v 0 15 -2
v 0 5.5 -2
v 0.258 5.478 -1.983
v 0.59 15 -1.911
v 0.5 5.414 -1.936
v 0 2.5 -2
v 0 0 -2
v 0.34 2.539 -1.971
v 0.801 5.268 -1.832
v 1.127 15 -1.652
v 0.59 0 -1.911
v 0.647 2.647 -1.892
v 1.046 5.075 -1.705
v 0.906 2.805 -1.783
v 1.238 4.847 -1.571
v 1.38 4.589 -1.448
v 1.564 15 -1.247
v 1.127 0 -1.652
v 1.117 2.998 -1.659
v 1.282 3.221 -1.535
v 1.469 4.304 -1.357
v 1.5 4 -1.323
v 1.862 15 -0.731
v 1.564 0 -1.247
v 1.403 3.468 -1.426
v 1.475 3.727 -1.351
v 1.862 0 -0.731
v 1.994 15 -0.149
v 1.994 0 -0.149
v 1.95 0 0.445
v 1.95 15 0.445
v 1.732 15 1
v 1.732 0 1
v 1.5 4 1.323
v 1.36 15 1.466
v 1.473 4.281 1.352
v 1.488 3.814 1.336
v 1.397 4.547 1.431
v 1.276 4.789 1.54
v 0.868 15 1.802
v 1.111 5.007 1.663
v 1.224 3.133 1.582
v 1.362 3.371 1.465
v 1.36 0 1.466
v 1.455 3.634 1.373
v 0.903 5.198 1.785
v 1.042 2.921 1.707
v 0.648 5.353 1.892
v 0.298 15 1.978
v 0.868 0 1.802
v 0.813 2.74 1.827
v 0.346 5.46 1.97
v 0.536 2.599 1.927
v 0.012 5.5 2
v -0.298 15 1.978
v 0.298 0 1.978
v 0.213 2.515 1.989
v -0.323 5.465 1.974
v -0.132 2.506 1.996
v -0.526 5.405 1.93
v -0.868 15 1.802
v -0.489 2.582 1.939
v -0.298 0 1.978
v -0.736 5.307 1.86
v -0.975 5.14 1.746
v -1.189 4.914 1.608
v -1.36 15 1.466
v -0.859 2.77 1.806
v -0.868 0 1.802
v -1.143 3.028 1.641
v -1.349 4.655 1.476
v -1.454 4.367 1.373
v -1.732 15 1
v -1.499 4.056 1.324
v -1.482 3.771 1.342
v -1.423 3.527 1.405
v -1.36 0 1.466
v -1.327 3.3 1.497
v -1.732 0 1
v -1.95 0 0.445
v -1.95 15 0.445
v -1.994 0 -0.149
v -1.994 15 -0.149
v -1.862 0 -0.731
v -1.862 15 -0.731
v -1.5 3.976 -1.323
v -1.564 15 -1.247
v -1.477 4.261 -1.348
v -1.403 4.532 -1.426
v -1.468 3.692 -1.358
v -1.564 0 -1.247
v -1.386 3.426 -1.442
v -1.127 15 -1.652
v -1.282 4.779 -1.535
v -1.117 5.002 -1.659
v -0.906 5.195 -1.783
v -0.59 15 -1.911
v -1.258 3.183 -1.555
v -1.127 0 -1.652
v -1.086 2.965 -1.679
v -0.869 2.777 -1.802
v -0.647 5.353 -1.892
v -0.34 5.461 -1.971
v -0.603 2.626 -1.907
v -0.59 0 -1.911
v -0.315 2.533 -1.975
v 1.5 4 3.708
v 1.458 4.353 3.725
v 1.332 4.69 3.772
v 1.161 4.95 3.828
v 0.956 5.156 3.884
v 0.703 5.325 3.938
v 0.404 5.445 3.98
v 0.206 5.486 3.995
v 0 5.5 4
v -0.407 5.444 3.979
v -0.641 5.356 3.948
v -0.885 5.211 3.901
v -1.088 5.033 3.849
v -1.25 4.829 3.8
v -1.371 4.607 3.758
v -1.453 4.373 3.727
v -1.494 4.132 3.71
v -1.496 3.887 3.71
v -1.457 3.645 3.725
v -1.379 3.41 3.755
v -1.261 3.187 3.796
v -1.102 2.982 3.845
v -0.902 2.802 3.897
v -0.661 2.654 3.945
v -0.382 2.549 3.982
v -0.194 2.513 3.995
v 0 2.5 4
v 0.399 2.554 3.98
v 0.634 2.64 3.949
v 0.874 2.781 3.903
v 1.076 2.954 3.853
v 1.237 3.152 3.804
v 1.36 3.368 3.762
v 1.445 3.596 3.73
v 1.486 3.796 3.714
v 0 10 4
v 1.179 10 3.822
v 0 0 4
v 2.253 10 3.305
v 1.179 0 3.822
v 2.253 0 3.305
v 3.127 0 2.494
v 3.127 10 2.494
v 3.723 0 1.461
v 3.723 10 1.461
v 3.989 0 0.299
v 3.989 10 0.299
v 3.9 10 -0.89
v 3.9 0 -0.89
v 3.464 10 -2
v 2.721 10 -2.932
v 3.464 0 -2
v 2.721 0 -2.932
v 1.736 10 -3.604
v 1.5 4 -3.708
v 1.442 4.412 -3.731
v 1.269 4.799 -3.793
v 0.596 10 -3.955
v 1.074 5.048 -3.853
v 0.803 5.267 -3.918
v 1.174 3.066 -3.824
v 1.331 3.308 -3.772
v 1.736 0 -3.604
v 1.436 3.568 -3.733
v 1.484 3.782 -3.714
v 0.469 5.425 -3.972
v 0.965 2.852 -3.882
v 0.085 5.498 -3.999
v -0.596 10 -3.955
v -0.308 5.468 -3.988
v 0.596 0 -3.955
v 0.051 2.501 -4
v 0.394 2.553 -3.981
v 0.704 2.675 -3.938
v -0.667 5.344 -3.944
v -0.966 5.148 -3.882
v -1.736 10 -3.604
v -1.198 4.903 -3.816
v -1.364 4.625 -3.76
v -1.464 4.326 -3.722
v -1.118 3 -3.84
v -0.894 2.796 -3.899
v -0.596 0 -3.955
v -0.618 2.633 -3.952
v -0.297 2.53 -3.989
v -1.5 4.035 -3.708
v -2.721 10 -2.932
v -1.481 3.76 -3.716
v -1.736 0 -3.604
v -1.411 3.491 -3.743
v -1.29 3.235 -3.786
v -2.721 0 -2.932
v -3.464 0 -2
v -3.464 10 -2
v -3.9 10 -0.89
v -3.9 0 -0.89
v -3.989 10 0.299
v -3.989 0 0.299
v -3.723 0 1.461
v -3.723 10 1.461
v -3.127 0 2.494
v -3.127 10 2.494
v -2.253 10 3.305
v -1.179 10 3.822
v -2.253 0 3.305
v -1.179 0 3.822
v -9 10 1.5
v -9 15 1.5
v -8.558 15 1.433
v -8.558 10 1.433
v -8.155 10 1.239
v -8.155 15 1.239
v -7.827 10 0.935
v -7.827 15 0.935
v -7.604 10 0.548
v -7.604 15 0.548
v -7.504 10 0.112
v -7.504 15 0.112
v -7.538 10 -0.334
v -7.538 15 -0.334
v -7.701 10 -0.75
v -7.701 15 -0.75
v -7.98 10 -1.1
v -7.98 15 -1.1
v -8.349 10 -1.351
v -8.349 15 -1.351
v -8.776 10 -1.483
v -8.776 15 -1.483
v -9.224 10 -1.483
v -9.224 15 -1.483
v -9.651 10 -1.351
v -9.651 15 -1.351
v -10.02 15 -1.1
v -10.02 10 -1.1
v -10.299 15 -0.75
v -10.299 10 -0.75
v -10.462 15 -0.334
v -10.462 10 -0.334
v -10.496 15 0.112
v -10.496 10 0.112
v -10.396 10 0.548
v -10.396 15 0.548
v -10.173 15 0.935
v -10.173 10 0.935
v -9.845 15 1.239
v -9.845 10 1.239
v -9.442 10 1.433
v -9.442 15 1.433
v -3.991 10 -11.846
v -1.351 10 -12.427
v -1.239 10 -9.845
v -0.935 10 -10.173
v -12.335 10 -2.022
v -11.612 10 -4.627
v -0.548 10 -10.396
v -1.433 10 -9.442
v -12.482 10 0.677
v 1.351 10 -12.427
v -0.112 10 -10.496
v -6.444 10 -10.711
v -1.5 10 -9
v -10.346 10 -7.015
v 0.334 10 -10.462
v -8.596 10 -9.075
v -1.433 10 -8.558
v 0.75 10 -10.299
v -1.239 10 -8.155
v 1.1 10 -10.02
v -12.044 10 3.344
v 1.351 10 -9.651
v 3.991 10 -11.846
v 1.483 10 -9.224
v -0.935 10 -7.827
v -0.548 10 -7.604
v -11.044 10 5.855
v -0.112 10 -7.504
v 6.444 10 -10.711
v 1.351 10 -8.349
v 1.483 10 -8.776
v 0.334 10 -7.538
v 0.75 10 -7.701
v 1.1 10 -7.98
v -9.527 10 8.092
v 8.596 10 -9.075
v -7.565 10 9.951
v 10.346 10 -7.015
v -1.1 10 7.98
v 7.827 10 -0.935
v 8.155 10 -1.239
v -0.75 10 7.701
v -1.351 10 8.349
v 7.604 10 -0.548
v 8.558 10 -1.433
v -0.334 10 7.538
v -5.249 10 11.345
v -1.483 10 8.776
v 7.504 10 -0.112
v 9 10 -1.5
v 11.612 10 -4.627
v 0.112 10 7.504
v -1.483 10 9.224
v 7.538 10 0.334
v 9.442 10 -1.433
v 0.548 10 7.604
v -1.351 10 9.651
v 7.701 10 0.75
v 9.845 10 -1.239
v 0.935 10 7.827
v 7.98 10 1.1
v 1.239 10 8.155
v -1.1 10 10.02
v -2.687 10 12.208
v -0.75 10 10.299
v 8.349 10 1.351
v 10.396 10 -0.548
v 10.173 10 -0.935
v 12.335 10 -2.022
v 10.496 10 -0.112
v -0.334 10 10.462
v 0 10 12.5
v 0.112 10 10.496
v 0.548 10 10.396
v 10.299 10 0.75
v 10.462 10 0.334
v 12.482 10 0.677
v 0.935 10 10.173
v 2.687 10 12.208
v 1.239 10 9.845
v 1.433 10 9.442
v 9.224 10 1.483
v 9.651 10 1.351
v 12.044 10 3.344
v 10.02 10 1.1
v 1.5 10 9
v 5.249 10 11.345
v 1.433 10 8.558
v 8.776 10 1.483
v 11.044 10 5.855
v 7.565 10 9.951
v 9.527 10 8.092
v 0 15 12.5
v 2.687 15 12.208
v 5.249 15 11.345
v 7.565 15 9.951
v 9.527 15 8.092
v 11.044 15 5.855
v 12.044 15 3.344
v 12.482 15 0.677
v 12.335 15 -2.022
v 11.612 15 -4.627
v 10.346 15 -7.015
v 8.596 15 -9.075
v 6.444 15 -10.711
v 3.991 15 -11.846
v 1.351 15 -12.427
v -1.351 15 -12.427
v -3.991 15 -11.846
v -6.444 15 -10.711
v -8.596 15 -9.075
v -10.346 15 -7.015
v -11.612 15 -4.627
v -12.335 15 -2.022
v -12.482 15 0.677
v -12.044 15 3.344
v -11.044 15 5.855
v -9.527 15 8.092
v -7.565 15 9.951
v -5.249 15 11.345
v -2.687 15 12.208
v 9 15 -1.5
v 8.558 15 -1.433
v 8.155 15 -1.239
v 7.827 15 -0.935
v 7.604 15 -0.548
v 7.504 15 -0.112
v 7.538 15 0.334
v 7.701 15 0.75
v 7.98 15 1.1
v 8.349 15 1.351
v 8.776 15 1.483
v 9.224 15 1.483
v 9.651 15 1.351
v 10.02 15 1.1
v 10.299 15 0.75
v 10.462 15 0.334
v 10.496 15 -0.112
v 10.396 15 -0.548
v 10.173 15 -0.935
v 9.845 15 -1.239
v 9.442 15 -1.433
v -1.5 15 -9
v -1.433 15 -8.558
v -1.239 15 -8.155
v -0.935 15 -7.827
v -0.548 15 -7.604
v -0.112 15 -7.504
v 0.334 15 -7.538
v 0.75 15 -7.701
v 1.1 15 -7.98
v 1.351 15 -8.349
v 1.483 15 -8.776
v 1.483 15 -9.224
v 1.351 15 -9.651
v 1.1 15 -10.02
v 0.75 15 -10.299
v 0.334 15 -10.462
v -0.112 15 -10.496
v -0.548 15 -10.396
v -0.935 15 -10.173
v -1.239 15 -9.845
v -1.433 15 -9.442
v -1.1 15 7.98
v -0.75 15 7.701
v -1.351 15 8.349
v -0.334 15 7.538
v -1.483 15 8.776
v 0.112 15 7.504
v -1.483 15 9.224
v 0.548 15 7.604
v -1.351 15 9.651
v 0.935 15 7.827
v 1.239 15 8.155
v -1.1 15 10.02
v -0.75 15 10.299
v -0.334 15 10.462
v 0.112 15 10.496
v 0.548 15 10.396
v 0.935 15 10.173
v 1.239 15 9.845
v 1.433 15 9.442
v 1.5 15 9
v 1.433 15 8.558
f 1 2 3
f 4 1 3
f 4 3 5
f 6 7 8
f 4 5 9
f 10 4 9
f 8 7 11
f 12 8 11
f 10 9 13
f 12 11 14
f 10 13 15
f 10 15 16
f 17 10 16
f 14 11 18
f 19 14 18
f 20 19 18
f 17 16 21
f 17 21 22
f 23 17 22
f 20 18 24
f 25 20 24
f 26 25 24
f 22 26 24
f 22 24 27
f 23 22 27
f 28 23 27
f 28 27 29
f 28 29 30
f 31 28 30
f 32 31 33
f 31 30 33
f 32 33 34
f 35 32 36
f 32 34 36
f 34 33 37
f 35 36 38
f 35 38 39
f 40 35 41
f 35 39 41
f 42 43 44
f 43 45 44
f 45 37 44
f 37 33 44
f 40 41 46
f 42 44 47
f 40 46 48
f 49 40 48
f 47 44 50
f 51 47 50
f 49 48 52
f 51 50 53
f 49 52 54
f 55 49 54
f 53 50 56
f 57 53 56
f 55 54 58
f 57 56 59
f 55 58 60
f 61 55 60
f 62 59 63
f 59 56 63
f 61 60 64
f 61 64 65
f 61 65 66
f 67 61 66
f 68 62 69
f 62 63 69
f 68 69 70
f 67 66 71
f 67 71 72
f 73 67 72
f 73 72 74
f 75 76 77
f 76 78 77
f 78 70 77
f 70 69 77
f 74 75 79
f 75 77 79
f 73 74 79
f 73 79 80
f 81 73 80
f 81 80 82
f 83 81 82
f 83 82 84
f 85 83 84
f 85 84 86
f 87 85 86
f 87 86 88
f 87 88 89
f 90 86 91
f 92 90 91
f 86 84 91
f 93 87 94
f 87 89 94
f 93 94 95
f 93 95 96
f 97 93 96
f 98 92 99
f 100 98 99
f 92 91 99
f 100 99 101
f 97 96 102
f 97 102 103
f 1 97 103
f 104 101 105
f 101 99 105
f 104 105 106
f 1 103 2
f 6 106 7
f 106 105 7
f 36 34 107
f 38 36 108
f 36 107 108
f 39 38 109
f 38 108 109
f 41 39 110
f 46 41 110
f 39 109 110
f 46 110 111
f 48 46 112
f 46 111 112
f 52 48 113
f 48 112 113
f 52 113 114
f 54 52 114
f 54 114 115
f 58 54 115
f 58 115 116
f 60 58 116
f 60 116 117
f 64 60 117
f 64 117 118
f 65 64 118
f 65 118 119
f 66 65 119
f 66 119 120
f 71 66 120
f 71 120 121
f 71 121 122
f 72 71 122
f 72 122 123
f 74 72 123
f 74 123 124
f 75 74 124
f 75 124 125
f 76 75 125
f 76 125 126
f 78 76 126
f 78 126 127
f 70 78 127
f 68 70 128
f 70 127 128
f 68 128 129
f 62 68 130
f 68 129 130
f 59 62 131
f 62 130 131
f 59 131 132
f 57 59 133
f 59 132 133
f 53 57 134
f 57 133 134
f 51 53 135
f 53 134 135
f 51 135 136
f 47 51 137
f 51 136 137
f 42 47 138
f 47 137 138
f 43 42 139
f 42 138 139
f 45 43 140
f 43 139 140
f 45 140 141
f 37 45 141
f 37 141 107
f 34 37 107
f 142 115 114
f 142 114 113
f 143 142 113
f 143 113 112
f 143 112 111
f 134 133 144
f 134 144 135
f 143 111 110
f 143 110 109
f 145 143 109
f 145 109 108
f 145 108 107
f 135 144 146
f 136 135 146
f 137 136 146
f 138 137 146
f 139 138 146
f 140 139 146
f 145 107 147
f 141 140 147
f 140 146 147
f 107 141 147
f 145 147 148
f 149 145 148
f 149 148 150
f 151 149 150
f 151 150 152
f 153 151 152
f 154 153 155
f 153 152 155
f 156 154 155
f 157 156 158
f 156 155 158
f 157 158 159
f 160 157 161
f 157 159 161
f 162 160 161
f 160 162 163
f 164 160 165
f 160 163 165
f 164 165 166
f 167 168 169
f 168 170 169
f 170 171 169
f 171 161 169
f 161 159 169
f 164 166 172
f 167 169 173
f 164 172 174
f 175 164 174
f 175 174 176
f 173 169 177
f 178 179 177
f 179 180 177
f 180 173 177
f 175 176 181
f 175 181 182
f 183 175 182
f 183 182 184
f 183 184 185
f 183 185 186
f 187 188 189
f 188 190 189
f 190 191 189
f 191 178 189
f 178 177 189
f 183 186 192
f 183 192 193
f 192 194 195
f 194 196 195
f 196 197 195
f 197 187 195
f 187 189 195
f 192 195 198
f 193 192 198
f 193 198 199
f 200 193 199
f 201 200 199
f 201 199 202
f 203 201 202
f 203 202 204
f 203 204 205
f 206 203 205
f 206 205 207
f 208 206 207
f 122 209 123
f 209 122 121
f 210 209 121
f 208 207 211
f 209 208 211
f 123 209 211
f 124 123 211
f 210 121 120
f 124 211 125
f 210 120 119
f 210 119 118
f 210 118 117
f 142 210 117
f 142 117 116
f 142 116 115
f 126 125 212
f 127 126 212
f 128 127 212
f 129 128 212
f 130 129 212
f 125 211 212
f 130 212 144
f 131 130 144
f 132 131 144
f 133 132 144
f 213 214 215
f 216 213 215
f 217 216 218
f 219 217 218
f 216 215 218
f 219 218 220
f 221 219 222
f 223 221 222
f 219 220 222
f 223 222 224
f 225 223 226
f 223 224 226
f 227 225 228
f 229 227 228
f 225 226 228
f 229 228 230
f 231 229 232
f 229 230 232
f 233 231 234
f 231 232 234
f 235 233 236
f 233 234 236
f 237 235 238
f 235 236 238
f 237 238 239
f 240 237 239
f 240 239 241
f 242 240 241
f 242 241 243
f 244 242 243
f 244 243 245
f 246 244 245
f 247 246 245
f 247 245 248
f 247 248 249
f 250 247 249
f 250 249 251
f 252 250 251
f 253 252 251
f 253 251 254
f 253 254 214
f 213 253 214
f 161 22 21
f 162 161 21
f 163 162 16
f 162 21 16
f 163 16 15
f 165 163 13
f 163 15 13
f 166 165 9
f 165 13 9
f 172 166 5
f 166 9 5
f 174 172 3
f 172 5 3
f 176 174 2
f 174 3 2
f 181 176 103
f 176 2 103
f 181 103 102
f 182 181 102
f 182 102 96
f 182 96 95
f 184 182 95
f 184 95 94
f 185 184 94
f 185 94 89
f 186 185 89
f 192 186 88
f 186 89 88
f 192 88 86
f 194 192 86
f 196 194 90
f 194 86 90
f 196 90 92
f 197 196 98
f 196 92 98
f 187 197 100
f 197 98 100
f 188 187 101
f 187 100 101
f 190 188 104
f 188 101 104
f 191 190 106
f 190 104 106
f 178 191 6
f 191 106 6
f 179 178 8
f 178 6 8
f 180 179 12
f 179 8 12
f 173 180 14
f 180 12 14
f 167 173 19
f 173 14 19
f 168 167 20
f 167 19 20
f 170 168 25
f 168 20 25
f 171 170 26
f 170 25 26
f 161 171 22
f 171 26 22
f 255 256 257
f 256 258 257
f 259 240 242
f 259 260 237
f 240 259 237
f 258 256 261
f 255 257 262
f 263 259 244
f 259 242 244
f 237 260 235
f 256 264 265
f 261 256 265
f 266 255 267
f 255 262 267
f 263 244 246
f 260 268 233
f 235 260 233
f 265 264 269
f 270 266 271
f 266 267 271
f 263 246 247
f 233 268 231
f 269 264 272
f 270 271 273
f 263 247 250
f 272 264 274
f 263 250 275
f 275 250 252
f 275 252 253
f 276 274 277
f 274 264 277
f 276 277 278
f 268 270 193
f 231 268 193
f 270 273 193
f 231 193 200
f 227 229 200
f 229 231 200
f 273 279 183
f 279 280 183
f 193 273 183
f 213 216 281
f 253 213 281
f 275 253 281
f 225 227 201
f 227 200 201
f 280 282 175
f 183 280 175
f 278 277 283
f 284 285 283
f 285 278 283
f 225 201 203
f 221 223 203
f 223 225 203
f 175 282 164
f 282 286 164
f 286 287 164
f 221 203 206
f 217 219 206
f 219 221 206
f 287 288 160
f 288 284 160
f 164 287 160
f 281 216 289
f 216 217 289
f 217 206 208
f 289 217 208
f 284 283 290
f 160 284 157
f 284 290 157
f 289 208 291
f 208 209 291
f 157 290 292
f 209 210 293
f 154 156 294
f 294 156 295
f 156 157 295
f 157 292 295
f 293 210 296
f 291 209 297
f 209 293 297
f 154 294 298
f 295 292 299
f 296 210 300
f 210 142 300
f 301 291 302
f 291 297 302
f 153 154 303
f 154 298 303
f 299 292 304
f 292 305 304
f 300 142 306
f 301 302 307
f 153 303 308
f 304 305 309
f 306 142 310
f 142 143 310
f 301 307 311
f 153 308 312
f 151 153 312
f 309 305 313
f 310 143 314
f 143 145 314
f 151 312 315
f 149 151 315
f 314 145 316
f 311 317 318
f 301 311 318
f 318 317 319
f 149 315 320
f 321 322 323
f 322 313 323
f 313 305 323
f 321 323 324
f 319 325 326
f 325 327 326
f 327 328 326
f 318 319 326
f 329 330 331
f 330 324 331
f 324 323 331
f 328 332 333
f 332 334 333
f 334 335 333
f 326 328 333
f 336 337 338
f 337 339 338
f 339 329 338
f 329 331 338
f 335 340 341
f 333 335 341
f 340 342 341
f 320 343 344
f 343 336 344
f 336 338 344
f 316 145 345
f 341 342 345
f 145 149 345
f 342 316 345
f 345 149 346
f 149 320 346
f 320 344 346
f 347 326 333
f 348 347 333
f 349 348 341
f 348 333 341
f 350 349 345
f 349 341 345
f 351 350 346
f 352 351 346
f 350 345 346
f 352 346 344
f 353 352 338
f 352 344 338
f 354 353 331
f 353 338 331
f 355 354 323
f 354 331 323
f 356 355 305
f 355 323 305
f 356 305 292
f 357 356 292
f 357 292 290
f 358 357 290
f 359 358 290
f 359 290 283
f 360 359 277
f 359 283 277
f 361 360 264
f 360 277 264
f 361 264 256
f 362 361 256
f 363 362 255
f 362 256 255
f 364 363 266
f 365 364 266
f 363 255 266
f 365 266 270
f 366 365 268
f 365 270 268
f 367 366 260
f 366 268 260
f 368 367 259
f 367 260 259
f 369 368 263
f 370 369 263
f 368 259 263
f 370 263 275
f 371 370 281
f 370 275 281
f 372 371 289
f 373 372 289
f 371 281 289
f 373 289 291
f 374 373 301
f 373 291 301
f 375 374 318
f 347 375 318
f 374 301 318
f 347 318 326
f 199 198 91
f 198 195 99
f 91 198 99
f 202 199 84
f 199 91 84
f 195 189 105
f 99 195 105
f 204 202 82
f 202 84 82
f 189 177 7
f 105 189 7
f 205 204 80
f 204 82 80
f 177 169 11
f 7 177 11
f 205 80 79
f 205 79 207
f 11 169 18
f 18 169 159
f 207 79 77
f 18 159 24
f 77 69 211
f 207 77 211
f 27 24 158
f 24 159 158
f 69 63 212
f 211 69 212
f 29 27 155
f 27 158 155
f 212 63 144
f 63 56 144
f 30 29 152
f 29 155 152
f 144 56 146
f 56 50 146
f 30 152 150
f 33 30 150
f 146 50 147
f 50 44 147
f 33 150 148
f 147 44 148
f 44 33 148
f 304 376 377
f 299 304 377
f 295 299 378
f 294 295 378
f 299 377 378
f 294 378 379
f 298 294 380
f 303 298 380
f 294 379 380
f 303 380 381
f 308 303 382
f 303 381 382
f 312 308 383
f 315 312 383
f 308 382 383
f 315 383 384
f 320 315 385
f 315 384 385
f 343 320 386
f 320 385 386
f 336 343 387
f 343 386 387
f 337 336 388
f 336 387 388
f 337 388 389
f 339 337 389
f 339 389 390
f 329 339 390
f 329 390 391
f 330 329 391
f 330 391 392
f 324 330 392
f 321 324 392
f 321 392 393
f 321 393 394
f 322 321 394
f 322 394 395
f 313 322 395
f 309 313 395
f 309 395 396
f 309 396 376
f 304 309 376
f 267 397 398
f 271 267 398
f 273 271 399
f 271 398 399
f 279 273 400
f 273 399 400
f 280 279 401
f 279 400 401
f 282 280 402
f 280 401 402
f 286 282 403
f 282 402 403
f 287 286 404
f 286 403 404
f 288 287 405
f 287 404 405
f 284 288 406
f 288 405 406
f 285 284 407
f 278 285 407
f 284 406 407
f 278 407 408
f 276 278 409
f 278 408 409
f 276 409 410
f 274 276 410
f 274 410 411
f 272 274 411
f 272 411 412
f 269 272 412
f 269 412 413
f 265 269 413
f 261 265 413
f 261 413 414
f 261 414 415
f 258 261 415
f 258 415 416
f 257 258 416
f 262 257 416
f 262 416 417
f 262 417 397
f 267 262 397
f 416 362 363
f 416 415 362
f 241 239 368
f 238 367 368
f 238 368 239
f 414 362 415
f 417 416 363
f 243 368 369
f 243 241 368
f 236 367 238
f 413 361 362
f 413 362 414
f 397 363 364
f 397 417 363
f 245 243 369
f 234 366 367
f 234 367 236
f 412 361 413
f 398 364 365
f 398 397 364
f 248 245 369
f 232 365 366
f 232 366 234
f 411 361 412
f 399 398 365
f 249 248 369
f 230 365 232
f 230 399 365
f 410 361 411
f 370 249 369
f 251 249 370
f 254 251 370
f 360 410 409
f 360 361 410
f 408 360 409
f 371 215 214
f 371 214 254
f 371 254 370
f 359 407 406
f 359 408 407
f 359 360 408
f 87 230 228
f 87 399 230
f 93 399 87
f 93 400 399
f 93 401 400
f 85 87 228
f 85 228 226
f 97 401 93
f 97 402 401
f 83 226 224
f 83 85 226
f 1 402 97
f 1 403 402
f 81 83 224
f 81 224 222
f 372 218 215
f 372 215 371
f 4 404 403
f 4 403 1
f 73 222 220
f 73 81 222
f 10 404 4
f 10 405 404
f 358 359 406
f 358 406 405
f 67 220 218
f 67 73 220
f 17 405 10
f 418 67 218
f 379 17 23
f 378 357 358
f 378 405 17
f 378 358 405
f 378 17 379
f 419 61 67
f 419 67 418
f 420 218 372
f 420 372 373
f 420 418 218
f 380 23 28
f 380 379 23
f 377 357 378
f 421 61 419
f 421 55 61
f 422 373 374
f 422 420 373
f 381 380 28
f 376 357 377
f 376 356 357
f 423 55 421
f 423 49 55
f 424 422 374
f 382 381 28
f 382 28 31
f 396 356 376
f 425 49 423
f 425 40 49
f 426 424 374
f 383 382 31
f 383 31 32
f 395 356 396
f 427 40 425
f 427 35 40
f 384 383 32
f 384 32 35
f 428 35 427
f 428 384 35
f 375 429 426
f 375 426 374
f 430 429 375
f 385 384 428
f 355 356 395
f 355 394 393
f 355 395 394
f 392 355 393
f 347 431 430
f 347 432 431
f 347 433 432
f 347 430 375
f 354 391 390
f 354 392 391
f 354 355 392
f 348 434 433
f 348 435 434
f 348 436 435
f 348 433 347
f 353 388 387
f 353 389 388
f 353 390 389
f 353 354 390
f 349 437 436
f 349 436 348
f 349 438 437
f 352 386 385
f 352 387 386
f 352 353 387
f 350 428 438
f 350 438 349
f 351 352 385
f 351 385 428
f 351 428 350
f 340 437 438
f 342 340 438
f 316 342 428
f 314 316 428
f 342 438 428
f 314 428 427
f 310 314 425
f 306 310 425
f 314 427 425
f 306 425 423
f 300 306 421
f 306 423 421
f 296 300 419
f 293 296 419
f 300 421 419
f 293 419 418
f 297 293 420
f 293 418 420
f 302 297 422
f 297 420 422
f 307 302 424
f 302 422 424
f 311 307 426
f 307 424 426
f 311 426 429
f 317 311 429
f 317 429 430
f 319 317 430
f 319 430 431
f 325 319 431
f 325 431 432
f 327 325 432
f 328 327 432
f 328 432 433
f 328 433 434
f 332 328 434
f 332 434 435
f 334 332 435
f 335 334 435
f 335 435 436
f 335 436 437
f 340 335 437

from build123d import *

# Parameters (mm, degrees)
SKETCH1_R                = 4
BOSS_EXTRUDE1_DEPTH      = 10
SKETCH3_R                = 12.5
BOSS_EXTRUDE2_DEPTH      = 5
F_3_0_3_DIAMETER_HOLE2_D = 3
SKETCH6_R                = 1.5
CUT_EXTRUDE2_DEPTH       = 10
SKETCH2_R                = 2
CUT_EXTRUDE1_DEPTH       = 24.184046239
CIRPATTERN1_COUNT        = 4


with BuildPart() as part:
    # Sketch1 → Boss-Extrude1 (new body)
    with BuildSketch(Plane(origin=(0, 0, 0), x_dir=(1, 0, 0), z_dir=(0, 1, 0))):
        with Locations(Location((0, 0, 0), (0, 0, 270))):
            Circle(SKETCH1_R)
    extrude(amount=BOSS_EXTRUDE1_DEPTH)

    # Sketch3 → Boss-Extrude2 (add)
    with BuildSketch(Plane(origin=(0, 10, 0), x_dir=(1, 0, 0), z_dir=(0, 1, 0))):
        with Locations(Location((0, 0, 0), (0, 0, 270))):
            Circle(SKETCH3_R)
    extrude(amount=BOSS_EXTRUDE2_DEPTH)

    # Ø3.0 (3) Diameter Hole2 (through all)
    with Locations(Plane(origin=(0, 4, -4), x_dir=(-1, 0, 0), z_dir=(0, 0, -1))):
        with Locations((0, 0)):
            Hole(F_3_0_3_DIAMETER_HOLE2_D / 2)

    # Sketch6 → Cut-Extrude2 (cut)
    with BuildSketch(Plane(origin=(0, 15, 0), x_dir=(1, 0, 0), z_dir=(0, 1, 0))):
        with Locations(Location((-9, 0, 0), (0, 0, 270))):
            Circle(SKETCH6_R)
    cut_extrude2 = extrude(amount=-CUT_EXTRUDE2_DEPTH, mode=Mode.SUBTRACT)

    # Sketch2 → Cut-Extrude1 (cut, through all)
    with BuildSketch(Plane.XZ):
        with Locations(Location((0, 0, 0), (0, 0, 270))):
            Circle(SKETCH2_R)
    extrude(amount=-CUT_EXTRUDE1_DEPTH, mode=Mode.SUBTRACT)

    # CirPattern1: Cut-Extrude2 ×4 about axis
    cirpattern1_axis = Axis((0, 0, 0), (0, 1, 0))
    for i in range(1, CIRPATTERN1_COUNT):
        add(cut_extrude2.rotate(cirpattern1_axis, i * 360 / CIRPATTERN1_COUNT), mode=Mode.SUBTRACT)


solid = part.part
